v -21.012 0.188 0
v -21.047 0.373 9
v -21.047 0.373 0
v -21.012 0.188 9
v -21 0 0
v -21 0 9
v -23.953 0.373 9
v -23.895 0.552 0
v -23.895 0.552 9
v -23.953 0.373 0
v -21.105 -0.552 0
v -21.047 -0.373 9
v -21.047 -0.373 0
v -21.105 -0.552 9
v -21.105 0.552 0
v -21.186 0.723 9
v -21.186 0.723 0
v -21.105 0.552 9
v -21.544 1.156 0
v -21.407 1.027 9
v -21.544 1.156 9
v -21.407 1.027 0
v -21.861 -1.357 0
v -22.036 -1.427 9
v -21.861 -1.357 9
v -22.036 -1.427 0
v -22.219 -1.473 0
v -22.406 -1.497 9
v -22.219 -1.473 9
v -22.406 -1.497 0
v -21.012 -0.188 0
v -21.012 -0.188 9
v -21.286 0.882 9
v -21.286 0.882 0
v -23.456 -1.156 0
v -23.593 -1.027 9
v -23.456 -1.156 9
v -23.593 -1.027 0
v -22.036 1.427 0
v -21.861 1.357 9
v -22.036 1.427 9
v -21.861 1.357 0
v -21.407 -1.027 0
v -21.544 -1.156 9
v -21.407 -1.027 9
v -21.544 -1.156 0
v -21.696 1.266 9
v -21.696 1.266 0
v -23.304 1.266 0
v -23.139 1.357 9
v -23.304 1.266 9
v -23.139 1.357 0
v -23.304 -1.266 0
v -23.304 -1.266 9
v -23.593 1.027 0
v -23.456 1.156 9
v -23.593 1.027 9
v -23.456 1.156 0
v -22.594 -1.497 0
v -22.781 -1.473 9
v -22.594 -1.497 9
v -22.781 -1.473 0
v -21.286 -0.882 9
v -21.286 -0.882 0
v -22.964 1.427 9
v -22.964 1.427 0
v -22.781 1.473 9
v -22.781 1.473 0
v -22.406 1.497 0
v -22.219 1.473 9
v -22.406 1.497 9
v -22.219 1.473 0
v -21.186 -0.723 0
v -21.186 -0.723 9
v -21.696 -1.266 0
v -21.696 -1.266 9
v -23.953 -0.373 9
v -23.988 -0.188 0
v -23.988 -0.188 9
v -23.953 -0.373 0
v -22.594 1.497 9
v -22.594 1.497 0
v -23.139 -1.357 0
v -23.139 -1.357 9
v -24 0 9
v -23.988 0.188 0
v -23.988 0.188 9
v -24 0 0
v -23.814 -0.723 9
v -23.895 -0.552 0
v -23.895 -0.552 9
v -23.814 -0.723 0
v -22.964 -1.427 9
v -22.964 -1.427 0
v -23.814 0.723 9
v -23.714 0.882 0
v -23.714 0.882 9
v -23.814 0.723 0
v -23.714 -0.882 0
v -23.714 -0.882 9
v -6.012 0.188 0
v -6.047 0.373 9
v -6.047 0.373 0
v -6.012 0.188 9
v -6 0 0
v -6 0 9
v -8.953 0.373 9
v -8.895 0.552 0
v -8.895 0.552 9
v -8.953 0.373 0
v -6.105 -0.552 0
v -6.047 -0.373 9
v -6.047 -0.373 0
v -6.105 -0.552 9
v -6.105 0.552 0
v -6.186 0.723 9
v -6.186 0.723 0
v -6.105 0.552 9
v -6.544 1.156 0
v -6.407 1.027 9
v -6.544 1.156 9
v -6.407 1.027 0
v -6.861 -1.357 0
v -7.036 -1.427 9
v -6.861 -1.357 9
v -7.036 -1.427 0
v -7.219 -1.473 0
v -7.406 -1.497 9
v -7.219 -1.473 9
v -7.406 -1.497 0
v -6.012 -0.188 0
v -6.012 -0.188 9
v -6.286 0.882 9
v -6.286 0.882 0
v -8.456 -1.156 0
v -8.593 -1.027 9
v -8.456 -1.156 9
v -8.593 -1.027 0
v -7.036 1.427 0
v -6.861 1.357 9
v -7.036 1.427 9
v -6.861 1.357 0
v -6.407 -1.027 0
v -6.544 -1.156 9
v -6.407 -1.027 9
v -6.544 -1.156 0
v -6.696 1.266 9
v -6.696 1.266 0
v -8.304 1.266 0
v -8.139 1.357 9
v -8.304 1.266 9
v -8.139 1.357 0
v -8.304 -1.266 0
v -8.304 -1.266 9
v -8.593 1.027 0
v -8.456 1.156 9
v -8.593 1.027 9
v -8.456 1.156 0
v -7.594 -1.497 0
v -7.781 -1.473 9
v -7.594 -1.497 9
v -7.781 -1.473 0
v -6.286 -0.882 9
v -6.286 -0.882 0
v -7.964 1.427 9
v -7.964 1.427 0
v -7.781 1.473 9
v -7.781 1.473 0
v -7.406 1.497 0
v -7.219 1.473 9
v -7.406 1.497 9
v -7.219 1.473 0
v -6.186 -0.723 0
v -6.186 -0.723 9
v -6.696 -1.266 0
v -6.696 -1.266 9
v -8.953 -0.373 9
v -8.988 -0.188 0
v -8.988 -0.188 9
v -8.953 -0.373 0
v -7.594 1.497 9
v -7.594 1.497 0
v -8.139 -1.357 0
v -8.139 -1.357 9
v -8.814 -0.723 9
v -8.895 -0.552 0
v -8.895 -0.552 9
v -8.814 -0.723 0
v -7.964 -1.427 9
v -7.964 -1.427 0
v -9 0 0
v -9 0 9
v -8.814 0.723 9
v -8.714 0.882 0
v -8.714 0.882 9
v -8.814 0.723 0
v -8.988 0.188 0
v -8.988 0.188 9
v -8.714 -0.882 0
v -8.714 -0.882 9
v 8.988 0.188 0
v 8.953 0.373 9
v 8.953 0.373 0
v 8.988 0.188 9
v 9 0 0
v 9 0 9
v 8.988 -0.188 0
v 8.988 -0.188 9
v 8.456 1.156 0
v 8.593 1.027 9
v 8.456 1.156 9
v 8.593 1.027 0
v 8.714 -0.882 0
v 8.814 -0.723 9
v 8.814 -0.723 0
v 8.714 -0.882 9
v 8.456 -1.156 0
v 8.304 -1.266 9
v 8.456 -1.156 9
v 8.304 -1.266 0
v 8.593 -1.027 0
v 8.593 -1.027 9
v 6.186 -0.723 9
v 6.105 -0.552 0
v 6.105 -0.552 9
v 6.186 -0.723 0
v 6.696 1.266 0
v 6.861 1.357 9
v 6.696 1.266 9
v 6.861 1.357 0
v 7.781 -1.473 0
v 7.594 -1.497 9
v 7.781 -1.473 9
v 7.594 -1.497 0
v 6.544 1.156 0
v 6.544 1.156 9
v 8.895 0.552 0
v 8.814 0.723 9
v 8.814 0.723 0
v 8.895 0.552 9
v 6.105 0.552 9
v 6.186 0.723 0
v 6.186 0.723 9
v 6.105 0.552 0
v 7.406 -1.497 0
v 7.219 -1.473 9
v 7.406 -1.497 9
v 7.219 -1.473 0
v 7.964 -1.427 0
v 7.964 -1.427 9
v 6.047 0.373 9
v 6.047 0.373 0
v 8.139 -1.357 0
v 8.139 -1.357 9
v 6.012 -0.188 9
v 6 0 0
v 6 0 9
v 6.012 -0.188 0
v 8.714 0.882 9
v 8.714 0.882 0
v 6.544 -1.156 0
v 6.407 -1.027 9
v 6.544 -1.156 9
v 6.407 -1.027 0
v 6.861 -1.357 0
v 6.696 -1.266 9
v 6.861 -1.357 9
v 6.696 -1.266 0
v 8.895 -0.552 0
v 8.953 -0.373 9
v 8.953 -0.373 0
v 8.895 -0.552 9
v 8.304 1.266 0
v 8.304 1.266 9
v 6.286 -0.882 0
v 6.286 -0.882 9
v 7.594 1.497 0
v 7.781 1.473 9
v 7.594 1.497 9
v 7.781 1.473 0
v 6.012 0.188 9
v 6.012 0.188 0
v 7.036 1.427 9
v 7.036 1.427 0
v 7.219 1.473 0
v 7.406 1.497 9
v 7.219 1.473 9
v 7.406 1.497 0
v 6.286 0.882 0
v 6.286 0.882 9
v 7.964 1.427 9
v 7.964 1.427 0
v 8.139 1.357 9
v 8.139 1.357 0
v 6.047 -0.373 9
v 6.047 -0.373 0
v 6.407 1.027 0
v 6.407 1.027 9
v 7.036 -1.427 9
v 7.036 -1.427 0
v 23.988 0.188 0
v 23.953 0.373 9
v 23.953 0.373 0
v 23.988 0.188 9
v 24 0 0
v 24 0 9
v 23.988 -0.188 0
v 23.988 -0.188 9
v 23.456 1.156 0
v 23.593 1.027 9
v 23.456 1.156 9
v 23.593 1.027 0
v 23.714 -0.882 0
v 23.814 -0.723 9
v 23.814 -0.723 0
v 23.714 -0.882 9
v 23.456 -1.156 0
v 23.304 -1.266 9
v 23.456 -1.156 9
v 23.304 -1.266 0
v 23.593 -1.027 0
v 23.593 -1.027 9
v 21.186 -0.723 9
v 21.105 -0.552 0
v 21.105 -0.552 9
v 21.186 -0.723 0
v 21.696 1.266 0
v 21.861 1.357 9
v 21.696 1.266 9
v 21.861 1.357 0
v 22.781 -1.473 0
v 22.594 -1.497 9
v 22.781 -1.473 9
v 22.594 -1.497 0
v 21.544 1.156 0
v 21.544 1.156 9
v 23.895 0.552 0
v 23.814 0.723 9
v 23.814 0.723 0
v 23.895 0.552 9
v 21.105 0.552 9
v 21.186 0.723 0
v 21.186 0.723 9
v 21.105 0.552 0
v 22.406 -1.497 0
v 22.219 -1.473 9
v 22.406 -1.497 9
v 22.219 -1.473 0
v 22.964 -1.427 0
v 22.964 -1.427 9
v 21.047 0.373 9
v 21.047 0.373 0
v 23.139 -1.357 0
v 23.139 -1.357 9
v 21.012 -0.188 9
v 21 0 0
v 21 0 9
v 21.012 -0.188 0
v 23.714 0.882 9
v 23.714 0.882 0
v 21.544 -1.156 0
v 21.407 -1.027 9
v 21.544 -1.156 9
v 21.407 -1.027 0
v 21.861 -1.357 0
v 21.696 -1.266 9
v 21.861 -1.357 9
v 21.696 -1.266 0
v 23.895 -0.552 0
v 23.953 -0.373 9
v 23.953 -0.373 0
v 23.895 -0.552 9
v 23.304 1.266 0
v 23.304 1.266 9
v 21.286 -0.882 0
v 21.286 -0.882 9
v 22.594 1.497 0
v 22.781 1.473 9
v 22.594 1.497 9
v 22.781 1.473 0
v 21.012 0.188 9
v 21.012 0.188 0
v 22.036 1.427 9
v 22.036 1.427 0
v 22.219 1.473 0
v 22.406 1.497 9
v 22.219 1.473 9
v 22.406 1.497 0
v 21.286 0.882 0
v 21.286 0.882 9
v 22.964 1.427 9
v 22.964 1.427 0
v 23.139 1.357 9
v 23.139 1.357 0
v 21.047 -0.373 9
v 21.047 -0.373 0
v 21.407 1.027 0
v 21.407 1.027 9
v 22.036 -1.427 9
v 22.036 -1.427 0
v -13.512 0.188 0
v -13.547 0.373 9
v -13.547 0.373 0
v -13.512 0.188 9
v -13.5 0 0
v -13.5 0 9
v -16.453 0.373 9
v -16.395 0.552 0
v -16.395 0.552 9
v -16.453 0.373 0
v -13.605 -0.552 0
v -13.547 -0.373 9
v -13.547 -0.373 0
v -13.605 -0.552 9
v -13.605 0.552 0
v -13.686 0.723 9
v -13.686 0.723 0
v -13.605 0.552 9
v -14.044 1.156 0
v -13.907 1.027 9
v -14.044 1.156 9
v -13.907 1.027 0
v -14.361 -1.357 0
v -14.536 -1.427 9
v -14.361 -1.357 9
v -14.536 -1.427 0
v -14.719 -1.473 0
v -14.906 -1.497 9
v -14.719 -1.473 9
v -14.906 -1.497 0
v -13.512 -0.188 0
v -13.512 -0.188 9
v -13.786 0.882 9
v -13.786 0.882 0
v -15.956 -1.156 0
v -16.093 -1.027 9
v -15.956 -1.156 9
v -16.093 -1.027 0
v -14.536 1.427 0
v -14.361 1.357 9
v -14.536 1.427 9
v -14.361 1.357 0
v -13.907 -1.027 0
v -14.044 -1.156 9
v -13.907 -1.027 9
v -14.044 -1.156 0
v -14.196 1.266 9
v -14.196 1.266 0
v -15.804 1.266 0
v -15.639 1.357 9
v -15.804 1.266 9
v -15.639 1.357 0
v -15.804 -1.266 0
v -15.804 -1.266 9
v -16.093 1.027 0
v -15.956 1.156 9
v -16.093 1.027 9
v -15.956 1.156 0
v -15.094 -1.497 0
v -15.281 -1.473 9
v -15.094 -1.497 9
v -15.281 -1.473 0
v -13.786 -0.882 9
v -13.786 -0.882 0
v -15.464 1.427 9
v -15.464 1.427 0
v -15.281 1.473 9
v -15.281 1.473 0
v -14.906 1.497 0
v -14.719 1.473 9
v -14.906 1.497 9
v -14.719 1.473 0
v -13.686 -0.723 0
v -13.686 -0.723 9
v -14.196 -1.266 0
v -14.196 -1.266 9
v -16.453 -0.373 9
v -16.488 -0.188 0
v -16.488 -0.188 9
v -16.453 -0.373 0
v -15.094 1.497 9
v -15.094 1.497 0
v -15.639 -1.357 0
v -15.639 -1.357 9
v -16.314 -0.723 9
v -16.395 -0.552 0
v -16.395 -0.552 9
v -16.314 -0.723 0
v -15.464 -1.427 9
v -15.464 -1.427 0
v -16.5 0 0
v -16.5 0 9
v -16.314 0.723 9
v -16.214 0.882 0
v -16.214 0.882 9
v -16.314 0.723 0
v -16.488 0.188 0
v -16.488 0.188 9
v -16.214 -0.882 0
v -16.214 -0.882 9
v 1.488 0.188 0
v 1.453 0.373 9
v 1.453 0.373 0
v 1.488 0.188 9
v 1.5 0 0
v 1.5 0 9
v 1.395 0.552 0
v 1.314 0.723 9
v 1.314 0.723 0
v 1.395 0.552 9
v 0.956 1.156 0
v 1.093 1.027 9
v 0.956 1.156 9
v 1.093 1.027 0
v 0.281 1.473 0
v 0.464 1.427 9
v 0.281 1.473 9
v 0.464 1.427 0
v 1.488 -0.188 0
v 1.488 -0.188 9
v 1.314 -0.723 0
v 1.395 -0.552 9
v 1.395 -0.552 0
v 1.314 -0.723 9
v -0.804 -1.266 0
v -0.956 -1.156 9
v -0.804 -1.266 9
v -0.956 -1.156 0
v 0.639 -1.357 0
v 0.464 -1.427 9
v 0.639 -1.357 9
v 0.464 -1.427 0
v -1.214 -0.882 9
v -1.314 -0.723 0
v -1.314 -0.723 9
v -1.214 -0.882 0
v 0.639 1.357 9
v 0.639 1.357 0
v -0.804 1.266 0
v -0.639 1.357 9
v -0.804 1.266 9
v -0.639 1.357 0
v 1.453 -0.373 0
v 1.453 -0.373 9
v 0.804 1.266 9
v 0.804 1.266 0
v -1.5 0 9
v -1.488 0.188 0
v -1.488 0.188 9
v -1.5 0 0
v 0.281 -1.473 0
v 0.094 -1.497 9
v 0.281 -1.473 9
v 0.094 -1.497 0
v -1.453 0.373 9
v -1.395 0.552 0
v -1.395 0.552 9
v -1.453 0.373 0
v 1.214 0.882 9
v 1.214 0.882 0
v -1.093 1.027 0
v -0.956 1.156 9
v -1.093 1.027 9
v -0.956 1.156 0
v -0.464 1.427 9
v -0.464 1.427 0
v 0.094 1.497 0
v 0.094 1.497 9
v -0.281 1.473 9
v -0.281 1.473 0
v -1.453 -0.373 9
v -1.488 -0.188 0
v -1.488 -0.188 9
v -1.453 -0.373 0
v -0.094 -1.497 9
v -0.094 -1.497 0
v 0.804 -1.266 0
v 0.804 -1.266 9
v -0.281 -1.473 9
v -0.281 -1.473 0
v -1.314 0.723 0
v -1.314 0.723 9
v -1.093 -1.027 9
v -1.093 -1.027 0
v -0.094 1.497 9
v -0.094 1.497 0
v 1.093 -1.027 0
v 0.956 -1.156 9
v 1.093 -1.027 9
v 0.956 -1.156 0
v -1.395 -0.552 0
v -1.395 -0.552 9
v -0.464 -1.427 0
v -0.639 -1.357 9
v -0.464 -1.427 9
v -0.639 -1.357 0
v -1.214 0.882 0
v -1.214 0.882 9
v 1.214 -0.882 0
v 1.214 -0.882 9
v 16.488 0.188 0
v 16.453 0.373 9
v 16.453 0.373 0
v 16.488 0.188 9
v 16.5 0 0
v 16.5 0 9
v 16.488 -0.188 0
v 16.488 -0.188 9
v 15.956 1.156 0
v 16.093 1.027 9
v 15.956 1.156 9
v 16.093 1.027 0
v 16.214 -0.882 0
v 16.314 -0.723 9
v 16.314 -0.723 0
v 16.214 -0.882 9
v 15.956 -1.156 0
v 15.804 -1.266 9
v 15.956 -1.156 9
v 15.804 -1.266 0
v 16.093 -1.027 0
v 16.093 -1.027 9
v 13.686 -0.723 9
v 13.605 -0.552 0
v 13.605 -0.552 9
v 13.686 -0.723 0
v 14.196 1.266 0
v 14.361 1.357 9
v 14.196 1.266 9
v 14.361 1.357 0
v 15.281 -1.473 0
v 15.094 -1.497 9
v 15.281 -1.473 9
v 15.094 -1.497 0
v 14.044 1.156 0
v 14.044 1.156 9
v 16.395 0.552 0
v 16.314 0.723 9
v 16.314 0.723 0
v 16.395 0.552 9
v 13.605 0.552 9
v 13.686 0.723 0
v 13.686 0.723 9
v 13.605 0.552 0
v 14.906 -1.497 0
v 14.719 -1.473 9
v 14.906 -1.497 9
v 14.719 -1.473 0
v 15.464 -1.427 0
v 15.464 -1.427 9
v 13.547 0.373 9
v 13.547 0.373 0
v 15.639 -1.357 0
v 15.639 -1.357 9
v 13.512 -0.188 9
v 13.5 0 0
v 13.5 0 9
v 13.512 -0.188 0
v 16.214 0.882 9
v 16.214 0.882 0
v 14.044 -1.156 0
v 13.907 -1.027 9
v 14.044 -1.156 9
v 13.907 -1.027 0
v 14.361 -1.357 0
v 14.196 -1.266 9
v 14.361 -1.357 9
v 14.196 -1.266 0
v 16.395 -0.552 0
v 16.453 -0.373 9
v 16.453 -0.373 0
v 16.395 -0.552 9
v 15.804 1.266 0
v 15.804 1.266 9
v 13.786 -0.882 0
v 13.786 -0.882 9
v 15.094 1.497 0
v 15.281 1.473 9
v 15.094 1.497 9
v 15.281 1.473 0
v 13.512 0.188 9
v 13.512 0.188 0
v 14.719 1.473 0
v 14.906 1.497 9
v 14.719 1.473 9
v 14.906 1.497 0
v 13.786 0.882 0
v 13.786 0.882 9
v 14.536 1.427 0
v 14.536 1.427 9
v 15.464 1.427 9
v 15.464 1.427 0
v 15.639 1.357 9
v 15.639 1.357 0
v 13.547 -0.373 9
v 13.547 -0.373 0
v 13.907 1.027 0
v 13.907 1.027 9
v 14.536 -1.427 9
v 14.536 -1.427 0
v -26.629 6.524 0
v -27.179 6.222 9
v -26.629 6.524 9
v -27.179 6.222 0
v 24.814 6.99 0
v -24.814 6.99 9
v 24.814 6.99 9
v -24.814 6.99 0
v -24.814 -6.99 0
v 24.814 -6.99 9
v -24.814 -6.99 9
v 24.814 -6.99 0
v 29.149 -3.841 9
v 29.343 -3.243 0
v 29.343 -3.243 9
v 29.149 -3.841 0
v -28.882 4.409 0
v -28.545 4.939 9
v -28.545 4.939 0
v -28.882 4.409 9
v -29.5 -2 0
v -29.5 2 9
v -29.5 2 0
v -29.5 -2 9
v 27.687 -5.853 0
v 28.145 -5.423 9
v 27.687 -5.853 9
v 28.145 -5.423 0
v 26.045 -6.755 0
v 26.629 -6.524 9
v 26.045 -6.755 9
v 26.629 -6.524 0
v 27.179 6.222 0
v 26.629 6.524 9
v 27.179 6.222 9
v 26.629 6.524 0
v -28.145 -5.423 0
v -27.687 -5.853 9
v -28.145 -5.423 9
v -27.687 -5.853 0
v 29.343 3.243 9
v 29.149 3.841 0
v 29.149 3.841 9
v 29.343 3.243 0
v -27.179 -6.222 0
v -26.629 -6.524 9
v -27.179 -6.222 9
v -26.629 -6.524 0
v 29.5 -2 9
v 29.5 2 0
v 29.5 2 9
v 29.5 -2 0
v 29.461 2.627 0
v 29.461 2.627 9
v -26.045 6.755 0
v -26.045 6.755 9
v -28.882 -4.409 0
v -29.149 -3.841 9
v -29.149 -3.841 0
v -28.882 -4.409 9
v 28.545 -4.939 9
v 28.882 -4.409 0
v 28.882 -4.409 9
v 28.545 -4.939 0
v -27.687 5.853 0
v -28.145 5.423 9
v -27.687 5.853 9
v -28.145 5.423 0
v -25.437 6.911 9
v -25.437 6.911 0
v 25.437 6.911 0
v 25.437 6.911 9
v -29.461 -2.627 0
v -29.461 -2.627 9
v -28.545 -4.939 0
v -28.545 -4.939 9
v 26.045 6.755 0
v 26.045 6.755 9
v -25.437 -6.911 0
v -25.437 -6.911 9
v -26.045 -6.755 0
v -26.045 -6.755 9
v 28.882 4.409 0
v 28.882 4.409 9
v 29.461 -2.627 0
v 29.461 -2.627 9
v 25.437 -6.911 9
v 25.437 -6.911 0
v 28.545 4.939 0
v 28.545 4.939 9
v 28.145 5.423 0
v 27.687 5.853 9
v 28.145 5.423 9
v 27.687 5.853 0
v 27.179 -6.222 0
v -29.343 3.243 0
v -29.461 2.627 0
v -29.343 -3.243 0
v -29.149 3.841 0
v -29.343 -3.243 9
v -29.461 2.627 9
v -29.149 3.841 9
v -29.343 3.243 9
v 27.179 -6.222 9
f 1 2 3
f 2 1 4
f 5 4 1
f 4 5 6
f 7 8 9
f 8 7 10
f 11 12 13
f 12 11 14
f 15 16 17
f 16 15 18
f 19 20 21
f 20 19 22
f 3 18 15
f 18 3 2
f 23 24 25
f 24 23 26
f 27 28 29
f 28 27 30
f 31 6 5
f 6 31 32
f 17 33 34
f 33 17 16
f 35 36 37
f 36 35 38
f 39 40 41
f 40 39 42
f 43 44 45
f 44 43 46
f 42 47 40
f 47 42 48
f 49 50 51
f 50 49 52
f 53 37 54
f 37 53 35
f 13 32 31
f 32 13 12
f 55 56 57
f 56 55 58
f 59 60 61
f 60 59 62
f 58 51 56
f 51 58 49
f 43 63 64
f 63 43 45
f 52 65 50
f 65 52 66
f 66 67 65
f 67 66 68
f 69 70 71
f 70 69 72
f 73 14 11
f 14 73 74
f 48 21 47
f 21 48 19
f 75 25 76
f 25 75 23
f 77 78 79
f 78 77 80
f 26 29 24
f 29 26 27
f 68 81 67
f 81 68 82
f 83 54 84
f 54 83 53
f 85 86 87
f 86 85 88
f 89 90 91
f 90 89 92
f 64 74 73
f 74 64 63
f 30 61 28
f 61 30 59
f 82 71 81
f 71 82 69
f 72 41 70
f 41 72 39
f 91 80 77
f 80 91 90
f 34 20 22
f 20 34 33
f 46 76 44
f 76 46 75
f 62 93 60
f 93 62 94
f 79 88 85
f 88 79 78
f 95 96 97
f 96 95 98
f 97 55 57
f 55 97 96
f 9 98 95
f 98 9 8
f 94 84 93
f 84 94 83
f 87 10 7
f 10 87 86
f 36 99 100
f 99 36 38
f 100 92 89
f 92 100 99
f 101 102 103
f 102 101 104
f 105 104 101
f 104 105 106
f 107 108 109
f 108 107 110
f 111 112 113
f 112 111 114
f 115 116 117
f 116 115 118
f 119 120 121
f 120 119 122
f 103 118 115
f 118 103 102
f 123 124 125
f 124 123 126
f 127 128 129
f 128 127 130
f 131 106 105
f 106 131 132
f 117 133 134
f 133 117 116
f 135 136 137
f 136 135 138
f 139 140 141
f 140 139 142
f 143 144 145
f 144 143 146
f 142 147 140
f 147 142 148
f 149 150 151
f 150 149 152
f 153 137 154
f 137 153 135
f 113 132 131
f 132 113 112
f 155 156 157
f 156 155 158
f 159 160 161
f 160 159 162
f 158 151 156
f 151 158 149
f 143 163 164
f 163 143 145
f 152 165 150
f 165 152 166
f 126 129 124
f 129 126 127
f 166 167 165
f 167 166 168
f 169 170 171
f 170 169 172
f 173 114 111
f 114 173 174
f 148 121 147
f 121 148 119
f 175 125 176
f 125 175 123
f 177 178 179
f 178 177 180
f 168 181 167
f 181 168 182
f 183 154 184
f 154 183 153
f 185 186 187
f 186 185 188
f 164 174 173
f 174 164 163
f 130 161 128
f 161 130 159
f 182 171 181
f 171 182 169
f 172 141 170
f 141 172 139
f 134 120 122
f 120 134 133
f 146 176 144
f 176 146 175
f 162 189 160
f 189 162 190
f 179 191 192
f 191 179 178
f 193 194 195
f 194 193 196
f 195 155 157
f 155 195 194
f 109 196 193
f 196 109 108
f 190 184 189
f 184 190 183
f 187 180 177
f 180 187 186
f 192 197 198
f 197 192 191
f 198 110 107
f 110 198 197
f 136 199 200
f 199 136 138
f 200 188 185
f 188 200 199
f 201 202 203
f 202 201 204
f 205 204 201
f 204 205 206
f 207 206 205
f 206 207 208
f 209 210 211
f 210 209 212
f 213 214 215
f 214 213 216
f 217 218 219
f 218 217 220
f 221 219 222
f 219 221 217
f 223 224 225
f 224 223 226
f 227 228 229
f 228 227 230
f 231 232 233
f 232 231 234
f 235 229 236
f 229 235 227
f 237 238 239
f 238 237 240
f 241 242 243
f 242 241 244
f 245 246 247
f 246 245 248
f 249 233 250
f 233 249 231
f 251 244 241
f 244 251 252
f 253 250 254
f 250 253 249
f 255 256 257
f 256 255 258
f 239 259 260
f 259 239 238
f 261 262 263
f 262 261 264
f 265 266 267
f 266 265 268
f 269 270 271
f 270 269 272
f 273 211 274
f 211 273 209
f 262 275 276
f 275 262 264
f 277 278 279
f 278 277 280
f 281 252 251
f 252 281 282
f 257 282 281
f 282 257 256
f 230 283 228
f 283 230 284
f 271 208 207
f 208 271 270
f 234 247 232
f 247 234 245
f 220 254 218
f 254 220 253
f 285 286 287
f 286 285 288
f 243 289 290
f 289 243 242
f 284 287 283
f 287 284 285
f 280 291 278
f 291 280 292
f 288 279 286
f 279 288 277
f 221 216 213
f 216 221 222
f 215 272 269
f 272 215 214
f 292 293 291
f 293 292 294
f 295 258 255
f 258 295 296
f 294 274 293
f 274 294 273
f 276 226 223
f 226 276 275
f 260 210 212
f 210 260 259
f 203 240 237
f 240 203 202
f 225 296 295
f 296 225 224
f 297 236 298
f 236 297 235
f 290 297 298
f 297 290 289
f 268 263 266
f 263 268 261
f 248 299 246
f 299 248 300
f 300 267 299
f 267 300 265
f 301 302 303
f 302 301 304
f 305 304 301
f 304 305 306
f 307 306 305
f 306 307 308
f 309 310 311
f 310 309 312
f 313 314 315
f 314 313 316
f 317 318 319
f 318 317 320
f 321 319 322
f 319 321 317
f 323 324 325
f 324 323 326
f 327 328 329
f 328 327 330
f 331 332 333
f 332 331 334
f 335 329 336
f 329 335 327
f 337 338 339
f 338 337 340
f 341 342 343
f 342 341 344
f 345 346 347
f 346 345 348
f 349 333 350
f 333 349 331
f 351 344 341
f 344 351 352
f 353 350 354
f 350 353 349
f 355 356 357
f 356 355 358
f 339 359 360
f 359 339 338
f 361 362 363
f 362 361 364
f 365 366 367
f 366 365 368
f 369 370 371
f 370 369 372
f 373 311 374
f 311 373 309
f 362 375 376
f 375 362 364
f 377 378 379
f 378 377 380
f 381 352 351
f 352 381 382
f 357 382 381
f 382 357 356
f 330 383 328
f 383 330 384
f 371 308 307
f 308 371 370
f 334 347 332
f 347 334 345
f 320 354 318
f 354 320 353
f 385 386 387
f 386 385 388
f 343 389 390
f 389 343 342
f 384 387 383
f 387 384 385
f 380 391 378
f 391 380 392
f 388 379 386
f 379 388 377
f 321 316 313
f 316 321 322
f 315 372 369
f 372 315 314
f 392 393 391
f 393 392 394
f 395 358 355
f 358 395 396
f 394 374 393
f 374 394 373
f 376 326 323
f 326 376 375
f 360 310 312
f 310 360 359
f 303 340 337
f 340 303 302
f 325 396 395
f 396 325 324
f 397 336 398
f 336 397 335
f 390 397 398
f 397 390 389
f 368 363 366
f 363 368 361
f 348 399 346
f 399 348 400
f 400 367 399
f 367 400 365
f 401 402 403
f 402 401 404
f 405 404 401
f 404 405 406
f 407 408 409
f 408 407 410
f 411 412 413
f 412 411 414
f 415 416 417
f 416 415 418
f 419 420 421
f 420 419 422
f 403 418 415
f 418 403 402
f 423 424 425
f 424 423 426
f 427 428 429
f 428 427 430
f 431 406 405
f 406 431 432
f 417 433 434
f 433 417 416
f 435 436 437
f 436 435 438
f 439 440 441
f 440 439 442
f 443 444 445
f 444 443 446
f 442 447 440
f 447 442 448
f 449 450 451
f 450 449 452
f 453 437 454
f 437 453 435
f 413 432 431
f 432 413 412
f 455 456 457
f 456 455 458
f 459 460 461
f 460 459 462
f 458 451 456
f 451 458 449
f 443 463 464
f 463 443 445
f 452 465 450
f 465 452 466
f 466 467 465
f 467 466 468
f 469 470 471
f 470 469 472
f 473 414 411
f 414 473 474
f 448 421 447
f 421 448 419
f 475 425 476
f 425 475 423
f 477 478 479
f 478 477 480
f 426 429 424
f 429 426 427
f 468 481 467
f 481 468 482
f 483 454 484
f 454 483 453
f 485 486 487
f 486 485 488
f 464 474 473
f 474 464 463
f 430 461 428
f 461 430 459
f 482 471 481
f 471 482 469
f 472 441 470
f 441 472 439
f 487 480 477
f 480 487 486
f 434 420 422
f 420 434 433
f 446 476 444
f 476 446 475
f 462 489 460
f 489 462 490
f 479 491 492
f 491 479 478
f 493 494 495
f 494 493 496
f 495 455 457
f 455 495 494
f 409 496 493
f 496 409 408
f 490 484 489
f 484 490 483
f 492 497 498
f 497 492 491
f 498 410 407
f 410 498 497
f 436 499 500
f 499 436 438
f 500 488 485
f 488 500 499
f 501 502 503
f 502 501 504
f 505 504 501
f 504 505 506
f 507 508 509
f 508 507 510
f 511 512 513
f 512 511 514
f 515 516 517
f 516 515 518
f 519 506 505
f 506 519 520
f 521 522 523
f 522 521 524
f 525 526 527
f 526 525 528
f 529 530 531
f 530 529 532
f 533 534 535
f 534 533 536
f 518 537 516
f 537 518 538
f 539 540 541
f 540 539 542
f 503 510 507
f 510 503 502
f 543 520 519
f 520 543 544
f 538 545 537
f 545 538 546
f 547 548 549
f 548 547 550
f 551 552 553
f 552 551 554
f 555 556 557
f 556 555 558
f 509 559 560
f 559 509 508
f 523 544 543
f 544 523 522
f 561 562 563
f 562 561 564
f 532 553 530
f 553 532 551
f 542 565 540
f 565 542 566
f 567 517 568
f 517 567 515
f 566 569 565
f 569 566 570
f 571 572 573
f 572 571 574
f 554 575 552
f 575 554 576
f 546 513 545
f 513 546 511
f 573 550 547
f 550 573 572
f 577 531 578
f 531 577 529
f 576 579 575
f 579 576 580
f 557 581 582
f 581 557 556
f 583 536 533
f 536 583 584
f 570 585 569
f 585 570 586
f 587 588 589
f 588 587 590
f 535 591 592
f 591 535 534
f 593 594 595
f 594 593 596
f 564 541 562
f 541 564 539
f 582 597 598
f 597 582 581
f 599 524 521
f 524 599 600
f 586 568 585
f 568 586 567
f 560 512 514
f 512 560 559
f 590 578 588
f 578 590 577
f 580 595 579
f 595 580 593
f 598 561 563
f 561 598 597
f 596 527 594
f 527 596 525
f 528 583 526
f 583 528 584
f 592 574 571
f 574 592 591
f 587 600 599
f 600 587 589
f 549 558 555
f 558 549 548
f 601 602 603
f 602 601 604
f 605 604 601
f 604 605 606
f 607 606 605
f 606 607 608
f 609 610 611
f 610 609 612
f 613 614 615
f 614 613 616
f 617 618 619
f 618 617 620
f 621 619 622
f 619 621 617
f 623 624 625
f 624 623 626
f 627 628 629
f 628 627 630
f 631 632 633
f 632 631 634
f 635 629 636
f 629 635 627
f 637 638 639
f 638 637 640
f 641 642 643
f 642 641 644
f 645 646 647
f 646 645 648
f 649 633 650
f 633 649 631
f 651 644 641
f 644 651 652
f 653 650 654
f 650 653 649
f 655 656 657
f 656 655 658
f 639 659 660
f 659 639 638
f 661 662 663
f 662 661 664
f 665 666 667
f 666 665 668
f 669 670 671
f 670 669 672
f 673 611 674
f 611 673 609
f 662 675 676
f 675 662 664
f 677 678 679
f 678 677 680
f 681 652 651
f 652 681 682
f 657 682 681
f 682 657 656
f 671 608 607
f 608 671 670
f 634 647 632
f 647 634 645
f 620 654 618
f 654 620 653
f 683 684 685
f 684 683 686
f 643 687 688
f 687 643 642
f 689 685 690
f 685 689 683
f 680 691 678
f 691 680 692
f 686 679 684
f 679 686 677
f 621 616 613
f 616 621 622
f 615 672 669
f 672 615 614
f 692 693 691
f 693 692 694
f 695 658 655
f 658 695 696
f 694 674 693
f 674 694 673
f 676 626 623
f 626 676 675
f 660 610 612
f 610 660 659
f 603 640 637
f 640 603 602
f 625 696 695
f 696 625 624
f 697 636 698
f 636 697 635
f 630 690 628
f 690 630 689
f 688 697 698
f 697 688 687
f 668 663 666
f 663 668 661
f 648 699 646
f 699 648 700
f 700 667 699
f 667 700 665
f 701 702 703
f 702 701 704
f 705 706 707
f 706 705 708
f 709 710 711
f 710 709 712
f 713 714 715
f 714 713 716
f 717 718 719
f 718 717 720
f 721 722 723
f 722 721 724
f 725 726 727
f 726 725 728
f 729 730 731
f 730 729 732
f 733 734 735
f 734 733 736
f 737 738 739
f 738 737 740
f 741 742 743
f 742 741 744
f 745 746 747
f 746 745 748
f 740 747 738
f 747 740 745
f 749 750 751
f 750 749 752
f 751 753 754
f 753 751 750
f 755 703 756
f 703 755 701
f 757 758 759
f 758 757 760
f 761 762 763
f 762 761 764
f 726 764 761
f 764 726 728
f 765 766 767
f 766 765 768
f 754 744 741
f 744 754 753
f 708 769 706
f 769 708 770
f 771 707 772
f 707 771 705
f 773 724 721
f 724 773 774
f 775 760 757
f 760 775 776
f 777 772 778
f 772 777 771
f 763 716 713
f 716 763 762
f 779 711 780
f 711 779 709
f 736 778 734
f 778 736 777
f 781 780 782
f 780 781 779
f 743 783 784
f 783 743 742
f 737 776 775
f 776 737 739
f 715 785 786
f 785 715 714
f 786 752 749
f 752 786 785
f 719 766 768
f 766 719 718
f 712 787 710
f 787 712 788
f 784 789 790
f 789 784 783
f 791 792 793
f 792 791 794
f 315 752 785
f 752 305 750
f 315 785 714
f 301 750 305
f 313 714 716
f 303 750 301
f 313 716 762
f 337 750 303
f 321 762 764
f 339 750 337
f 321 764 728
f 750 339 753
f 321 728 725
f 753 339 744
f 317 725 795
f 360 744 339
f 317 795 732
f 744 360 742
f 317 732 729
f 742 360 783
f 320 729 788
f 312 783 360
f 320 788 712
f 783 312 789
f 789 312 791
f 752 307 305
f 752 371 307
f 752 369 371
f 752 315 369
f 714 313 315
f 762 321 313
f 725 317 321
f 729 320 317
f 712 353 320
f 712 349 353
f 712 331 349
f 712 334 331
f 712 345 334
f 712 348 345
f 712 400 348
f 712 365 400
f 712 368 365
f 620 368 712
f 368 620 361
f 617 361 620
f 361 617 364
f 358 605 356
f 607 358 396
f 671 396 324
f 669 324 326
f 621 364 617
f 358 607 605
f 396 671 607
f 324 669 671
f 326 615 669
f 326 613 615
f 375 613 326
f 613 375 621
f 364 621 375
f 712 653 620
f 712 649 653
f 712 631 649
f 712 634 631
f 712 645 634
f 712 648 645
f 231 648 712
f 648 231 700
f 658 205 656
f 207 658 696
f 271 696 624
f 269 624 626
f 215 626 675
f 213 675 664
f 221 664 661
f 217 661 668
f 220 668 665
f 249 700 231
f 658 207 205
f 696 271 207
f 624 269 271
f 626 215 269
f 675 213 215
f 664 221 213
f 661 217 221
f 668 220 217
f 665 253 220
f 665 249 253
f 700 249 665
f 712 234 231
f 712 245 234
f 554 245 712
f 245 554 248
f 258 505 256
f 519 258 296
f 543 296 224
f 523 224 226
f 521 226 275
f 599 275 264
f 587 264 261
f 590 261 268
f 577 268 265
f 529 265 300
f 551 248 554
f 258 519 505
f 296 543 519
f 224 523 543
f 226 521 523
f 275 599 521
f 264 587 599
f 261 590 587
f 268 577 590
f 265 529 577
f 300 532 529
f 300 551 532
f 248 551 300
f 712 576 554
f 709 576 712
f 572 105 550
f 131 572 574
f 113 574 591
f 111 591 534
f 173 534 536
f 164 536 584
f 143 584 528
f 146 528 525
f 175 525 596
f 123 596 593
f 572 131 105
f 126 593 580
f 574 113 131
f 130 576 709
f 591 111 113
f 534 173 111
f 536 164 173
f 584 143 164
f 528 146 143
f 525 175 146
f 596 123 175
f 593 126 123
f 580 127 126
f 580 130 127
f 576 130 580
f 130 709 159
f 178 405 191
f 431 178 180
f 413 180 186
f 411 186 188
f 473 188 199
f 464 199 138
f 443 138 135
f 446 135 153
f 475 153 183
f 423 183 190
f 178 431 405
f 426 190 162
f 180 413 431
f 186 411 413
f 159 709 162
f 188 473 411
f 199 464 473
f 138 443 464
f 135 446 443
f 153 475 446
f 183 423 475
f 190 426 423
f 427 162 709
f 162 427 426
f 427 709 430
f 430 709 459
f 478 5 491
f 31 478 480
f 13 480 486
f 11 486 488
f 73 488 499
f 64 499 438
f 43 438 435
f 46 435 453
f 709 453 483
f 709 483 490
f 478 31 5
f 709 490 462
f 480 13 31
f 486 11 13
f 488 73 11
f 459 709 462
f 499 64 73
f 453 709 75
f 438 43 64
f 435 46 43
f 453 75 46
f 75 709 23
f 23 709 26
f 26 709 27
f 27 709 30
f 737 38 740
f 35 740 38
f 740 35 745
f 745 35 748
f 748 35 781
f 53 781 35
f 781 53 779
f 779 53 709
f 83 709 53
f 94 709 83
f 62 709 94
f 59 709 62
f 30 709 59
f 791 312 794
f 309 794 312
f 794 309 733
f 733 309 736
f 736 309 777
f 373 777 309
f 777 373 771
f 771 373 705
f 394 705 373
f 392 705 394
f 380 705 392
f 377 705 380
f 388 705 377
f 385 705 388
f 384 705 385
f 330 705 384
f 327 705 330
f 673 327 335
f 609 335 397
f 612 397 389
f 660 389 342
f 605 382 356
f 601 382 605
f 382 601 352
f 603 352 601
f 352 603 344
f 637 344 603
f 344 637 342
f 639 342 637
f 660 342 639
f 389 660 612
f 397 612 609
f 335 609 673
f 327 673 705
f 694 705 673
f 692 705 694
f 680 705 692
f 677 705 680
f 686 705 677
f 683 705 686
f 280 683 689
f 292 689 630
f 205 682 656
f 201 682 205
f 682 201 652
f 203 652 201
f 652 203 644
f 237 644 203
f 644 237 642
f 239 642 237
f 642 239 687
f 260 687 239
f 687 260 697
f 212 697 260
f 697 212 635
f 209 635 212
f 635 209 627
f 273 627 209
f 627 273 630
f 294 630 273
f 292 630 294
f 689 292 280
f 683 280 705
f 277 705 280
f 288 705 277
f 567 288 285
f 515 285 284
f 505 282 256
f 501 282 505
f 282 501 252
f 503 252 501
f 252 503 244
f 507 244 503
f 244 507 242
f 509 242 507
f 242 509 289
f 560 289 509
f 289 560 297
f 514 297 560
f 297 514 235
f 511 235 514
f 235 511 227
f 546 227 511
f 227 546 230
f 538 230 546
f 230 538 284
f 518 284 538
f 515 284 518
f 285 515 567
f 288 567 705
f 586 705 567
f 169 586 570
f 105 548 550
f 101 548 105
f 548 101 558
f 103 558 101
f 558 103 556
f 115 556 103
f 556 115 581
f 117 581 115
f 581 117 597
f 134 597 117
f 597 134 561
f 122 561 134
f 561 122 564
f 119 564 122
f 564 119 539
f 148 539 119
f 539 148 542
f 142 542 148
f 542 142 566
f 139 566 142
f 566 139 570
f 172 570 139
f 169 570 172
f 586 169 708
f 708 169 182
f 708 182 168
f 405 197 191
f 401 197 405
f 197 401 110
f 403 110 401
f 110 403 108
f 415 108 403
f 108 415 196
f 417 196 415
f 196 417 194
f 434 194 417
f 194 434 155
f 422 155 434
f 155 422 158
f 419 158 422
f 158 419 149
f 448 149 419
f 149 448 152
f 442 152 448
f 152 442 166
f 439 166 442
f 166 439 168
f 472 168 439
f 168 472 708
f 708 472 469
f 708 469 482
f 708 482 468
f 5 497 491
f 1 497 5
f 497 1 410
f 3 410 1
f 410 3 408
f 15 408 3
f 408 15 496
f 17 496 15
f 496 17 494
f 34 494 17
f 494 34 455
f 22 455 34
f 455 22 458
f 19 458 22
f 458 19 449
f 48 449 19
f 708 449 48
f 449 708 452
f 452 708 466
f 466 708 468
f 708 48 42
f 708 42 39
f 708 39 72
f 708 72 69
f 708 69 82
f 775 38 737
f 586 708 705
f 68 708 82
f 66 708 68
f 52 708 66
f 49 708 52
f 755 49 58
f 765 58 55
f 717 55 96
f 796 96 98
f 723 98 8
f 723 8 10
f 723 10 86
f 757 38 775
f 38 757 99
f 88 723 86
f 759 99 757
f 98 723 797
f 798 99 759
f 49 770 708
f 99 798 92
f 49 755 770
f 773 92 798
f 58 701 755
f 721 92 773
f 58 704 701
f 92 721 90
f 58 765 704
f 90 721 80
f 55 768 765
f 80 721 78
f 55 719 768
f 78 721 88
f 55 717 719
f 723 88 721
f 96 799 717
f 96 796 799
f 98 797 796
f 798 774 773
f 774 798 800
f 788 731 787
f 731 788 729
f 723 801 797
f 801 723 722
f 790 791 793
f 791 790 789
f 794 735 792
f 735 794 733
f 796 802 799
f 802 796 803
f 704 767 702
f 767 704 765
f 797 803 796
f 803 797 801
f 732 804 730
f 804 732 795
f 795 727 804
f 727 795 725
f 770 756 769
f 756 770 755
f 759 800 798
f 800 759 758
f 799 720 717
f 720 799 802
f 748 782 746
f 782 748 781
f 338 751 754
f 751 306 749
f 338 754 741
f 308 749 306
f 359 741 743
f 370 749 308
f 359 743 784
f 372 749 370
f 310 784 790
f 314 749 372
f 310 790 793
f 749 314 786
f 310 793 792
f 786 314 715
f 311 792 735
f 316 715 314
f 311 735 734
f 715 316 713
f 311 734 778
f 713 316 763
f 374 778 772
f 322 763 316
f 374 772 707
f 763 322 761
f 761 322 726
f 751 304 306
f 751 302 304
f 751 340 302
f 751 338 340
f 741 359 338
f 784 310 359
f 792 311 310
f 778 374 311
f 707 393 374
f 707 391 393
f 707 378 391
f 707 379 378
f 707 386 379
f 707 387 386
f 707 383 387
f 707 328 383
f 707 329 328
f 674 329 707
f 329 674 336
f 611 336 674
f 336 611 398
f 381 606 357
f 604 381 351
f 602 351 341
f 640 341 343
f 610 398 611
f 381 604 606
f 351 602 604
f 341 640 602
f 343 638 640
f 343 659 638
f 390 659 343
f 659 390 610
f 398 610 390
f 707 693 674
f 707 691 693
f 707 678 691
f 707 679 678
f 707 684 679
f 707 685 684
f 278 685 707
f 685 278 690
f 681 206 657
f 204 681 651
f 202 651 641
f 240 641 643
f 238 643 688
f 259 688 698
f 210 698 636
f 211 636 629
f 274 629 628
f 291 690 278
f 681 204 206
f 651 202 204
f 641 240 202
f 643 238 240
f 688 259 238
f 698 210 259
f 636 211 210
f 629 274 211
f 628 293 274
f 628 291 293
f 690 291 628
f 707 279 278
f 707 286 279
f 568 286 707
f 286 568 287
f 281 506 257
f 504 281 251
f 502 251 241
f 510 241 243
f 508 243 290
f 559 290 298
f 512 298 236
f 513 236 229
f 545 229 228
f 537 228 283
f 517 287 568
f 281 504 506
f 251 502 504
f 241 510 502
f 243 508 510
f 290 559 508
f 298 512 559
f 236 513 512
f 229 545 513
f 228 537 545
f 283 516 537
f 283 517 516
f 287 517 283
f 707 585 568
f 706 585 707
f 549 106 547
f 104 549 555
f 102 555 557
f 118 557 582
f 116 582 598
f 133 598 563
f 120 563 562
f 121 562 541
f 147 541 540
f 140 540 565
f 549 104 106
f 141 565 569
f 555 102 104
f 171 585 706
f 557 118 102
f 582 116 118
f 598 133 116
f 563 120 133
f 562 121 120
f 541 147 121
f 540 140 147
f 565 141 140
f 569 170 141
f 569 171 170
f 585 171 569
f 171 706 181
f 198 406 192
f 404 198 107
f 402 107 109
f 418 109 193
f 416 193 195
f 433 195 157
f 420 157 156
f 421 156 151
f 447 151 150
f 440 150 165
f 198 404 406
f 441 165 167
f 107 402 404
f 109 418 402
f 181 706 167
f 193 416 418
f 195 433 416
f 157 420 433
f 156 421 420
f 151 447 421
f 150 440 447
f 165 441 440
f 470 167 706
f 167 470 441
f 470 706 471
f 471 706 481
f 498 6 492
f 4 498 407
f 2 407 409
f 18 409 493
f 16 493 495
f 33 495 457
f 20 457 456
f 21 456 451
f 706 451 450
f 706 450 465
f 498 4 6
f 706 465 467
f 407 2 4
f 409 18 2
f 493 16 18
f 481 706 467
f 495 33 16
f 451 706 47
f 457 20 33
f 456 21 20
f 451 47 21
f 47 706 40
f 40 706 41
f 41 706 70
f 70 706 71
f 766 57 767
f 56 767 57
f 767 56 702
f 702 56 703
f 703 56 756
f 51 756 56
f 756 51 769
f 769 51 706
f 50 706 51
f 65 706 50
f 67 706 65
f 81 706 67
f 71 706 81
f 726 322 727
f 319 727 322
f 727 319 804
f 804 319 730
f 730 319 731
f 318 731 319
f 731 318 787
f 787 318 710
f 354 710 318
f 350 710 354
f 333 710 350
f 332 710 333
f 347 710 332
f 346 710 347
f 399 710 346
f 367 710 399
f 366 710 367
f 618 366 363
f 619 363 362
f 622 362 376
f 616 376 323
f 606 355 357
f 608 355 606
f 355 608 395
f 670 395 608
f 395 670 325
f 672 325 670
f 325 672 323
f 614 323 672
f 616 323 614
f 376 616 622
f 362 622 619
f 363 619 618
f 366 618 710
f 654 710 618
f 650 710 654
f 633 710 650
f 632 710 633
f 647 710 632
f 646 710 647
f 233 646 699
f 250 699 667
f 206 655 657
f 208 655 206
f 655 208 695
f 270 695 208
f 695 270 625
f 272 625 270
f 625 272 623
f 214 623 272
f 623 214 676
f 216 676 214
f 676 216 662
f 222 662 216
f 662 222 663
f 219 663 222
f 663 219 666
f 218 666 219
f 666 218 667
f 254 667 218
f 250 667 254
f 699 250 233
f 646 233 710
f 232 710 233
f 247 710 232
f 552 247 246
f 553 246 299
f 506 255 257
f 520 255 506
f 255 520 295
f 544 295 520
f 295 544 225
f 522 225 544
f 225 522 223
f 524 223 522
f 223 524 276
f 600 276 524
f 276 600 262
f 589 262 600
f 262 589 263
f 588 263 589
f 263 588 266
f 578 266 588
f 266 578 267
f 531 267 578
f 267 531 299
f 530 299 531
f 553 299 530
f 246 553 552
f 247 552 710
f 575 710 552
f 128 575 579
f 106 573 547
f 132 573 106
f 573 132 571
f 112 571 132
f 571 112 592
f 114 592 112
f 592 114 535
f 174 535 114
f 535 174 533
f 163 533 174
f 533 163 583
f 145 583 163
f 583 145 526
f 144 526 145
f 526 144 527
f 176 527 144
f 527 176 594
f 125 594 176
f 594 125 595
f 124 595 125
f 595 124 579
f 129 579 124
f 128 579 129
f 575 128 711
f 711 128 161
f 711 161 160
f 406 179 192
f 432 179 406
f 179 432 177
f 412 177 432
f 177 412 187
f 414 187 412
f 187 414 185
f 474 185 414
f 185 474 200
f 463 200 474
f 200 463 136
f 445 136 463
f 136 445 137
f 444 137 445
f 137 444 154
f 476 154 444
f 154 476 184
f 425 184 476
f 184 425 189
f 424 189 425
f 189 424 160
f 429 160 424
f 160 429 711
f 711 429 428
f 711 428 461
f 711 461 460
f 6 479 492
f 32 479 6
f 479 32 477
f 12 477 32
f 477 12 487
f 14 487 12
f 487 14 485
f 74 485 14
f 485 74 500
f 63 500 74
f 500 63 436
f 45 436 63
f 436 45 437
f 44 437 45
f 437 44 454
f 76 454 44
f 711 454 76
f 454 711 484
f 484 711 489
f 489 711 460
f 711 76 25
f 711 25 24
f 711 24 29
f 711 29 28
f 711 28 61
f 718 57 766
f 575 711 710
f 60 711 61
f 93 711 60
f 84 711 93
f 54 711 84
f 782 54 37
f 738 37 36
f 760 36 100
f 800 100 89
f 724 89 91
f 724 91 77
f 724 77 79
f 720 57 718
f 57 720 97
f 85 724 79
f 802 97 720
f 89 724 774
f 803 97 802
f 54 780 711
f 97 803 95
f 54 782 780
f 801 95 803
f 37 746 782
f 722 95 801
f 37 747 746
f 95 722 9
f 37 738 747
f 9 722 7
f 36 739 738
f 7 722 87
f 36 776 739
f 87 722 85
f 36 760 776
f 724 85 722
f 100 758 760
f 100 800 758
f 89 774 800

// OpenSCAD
$fn = 50;


difference() {
	union() {
		hull() {
			translate(v = [-24.5000000000, 2.0000000000, 0]) {
				cylinder(h = 9, r = 5);
			}
			translate(v = [24.5000000000, 2.0000000000, 0]) {
				cylinder(h = 9, r = 5);
			}
			translate(v = [-24.5000000000, -2.0000000000, 0]) {
				cylinder(h = 9, r = 5);
			}
			translate(v = [24.5000000000, -2.0000000000, 0]) {
				cylinder(h = 9, r = 5);
			}
		}
	}
	union() {
		translate(v = [-22.5000000000, 0.0000000000, 0]) {
			translate(v = [0, 0, -100]) {
				cylinder(h = 200, r = 1.5000000000);
			}
		}
		translate(v = [-7.5000000000, 0.0000000000, 0]) {
			translate(v = [0, 0, -100]) {
				cylinder(h = 200, r = 1.5000000000);
			}
		}
		translate(v = [7.5000000000, 0.0000000000, 0]) {
			translate(v = [0, 0, -100]) {
				cylinder(h = 200, r = 1.5000000000);
			}
		}
		translate(v = [22.5000000000, 0.0000000000, 0]) {
			translate(v = [0, 0, -100]) {
				cylinder(h = 200, r = 1.5000000000);
			}
		}
		translate(v = [-22.5000000000, 0.0000000000, 0]) {
			translate(v = [0, 0, -100]) {
				cylinder(h = 200, r = 1.5000000000);
			}
		}
		translate(v = [-15.0000000000, 0.0000000000, 0]) {
			translate(v = [0, 0, -100]) {
				cylinder(h = 200, r = 1.5000000000);
			}
		}
		translate(v = [-7.5000000000, 0.0000000000, 0]) {
			translate(v = [0, 0, -100]) {
				cylinder(h = 200, r = 1.5000000000);
			}
		}
		translate(v = [0, 0, -100]) {
			cylinder(h = 200, r = 1.5000000000);
		}
		translate(v = [7.5000000000, 0.0000000000, 0]) {
			translate(v = [0, 0, -100]) {
				cylinder(h = 200, r = 1.5000000000);
			}
		}
		translate(v = [15.0000000000, 0.0000000000, 0]) {
			translate(v = [0, 0, -100]) {
				cylinder(h = 200, r = 1.5000000000);
			}
		}
		translate(v = [22.5000000000, 0.0000000000, 0]) {
			translate(v = [0, 0, -100]) {
				cylinder(h = 200, r = 1.5000000000);
			}
		}
	}
}
